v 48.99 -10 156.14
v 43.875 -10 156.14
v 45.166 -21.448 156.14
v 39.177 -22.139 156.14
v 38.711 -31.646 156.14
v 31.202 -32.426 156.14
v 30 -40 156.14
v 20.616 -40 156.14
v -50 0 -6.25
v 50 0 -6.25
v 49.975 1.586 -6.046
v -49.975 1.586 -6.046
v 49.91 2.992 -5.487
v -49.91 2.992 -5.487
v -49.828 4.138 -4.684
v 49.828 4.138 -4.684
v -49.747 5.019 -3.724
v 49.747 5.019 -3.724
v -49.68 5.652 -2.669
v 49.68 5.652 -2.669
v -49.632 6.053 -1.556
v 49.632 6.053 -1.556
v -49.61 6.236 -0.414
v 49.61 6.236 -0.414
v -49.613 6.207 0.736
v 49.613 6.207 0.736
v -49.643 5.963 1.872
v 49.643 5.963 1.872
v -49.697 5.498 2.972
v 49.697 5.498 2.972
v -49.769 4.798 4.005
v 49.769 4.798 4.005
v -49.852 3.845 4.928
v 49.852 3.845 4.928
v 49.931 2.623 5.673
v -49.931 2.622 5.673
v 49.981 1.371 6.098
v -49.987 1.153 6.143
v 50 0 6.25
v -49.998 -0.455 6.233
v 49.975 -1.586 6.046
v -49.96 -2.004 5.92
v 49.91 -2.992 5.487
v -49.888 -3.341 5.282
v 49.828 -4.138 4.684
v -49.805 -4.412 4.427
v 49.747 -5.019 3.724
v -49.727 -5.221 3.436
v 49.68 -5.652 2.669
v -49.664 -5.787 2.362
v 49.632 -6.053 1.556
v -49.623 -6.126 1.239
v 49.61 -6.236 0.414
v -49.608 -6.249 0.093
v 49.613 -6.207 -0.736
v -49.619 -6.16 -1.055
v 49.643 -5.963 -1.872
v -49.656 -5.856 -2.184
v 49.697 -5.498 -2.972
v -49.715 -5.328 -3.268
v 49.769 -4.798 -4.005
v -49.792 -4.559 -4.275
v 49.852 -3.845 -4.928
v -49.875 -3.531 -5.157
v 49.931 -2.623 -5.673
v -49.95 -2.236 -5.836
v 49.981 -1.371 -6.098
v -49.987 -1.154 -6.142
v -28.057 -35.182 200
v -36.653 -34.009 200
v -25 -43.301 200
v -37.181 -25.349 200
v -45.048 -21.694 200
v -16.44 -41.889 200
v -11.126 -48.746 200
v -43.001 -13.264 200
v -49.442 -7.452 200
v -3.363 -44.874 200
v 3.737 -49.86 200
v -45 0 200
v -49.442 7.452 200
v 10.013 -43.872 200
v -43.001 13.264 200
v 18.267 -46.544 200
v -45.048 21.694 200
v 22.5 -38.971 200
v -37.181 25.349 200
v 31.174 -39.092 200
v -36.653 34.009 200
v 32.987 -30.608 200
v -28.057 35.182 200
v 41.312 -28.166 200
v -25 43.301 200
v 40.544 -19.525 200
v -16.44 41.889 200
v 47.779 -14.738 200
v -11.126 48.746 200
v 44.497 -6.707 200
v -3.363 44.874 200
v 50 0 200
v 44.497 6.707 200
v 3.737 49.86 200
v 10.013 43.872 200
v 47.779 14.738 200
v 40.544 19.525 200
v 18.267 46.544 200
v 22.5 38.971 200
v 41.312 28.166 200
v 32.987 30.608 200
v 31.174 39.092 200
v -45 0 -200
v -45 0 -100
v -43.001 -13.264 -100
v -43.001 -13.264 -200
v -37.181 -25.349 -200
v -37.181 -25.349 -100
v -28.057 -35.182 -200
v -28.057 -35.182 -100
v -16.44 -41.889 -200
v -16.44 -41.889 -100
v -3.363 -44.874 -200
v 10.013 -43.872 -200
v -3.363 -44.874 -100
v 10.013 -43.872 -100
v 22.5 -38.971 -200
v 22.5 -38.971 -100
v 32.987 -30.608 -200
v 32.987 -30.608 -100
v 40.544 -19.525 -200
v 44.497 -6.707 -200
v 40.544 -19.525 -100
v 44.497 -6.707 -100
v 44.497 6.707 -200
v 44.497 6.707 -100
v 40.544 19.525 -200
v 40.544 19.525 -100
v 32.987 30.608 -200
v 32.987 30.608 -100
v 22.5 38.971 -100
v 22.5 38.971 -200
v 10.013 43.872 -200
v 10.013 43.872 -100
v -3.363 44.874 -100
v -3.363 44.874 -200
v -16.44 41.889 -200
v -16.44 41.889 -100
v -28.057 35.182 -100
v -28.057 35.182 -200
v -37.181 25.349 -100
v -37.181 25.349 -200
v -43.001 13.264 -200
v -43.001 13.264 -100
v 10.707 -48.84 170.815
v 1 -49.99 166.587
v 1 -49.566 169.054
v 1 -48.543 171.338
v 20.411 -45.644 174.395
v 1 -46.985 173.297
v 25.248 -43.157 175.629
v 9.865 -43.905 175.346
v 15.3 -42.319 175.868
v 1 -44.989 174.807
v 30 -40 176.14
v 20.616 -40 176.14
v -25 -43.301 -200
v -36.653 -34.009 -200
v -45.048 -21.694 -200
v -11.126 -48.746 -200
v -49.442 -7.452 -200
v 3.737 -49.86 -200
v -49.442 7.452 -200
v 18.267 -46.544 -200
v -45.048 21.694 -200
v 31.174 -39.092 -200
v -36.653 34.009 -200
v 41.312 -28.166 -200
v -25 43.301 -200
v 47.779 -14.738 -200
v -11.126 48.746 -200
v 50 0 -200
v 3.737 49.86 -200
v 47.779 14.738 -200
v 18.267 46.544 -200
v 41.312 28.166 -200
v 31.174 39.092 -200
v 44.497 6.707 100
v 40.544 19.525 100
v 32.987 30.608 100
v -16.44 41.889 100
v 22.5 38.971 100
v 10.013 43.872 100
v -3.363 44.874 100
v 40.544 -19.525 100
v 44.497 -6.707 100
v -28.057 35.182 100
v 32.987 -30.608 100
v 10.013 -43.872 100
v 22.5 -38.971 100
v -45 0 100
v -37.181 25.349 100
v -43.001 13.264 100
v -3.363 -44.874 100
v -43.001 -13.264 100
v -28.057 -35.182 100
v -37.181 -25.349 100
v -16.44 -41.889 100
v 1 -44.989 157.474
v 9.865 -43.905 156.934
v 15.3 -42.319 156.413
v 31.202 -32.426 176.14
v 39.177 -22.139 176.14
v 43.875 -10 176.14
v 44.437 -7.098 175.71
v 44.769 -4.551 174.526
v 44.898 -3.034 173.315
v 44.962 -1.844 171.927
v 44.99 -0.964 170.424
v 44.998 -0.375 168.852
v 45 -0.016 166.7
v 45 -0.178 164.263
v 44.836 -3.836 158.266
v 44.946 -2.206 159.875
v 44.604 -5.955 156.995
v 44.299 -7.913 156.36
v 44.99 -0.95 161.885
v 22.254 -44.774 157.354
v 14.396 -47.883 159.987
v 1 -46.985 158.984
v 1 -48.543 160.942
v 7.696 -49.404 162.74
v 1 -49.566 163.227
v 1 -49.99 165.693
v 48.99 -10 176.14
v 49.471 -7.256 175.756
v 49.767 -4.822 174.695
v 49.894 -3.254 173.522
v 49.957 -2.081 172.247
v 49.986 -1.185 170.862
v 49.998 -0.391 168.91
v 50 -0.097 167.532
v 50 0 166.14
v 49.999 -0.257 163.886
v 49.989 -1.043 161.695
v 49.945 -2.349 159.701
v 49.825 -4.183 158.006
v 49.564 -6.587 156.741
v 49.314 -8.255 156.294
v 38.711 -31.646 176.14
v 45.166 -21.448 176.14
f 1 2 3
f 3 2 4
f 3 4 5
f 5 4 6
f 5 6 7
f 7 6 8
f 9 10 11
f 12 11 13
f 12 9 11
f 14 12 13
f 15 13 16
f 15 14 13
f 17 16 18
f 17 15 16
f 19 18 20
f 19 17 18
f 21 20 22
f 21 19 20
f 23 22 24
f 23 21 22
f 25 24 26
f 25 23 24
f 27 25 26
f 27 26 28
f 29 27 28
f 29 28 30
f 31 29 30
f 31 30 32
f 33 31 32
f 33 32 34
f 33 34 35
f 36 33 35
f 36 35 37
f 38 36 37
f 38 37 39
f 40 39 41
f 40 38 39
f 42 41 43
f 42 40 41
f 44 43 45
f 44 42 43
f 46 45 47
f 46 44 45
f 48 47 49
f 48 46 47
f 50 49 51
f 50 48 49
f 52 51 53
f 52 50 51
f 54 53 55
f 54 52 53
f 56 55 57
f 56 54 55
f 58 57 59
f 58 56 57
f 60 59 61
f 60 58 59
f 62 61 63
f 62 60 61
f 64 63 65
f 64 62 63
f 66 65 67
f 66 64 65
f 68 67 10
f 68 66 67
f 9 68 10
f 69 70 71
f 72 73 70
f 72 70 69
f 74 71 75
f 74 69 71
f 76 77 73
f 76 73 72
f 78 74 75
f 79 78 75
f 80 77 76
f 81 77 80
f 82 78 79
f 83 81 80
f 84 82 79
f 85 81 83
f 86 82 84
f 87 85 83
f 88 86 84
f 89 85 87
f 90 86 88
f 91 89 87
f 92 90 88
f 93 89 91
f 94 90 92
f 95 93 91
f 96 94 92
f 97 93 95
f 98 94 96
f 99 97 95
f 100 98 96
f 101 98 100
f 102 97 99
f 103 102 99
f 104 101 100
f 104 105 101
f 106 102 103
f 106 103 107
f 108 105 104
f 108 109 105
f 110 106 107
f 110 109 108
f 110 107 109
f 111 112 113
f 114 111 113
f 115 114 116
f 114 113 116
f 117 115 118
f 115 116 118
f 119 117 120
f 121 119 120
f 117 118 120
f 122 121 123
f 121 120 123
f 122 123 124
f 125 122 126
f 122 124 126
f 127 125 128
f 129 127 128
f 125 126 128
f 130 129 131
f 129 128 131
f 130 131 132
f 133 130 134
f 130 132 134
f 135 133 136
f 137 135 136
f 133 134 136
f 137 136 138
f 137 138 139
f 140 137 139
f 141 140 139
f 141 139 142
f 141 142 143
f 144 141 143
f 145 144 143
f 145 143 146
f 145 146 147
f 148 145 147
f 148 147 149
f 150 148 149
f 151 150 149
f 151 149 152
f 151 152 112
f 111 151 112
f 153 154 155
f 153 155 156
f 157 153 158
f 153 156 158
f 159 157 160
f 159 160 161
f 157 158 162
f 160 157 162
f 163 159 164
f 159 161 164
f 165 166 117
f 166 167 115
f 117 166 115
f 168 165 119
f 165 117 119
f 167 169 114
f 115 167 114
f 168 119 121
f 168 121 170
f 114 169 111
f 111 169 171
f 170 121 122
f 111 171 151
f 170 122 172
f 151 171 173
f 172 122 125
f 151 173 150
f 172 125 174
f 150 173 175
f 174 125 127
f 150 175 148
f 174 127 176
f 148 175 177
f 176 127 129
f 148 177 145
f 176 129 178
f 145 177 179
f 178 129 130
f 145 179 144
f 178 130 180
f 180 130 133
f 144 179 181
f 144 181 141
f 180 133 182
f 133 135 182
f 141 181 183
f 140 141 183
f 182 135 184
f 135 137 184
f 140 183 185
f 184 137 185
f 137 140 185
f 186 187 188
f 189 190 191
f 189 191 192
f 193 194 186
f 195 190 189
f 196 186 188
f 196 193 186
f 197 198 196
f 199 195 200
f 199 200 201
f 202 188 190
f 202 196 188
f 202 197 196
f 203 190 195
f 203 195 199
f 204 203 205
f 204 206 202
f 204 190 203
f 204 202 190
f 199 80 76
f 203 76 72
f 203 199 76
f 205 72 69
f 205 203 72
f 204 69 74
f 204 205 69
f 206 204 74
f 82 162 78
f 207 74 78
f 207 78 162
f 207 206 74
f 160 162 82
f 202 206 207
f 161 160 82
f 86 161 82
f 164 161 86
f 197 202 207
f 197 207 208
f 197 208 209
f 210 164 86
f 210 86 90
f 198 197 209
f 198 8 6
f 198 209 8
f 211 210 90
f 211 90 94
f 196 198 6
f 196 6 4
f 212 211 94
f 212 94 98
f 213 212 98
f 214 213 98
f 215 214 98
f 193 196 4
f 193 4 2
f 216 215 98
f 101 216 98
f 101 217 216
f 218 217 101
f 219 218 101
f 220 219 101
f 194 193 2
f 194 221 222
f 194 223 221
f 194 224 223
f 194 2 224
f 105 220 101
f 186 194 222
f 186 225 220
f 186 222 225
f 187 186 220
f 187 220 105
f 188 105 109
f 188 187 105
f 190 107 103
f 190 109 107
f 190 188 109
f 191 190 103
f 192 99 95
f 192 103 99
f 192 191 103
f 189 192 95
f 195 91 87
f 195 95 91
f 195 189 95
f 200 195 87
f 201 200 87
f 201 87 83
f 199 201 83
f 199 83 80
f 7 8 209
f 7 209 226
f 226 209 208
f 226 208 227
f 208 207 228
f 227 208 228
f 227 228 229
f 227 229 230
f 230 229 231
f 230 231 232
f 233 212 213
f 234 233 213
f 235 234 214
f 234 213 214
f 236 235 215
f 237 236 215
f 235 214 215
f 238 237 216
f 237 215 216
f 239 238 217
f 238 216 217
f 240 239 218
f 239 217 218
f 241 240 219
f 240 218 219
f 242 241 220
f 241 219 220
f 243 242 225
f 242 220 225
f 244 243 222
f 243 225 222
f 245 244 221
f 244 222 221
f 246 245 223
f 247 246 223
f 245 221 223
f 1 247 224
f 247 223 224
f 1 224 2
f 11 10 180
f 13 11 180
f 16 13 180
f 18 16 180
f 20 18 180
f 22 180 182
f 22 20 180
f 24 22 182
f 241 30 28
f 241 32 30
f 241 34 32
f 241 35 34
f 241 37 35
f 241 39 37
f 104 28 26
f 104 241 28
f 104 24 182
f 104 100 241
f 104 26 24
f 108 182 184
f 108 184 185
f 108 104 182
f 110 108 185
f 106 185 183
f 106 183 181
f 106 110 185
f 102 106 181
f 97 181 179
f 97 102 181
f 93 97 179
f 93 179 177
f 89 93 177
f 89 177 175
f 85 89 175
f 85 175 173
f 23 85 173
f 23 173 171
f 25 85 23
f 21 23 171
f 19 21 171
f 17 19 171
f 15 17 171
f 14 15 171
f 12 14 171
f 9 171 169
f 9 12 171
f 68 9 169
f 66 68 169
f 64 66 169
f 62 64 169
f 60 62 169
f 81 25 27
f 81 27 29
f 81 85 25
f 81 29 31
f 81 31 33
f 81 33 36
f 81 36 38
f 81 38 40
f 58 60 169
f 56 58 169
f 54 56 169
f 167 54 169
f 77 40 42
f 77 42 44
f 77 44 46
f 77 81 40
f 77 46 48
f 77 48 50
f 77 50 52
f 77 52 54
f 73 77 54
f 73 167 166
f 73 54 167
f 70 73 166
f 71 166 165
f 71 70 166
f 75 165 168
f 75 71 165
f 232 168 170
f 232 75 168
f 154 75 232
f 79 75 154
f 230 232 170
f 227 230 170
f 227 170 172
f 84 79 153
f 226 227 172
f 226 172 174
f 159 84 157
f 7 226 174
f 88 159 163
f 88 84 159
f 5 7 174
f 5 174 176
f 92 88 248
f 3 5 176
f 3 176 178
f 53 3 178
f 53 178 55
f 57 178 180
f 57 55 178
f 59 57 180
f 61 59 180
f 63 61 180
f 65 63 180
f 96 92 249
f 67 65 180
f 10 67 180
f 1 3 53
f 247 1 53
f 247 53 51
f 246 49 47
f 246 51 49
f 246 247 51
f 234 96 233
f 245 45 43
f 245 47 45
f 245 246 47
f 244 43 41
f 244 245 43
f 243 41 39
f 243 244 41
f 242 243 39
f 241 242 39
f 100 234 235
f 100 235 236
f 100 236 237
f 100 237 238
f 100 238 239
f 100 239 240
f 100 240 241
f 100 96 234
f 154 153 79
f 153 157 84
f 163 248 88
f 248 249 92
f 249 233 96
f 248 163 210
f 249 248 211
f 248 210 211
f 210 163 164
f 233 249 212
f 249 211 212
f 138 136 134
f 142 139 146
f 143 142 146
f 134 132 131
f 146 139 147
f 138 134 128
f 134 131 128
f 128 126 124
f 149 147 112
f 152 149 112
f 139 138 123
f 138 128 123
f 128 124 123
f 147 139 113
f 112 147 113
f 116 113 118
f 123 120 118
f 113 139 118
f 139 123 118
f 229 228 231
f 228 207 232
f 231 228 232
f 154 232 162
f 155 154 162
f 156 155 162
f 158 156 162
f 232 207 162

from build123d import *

# Parameters (mm, degrees)
ESQUISSE2_R                   = 50
BOSS_EXTRU_1_DEPTH            = 200
ENL_V_MAT_EXTRU_1_DEPTH       = 213.132034356
ENL_V_MAT_EXTRU_1_DEPTH_BACK  = 213.132034356
ESQUISSE3_R                   = 6.25
ENL_V_START                   = -100
ESQUISSE4_R                   = 45
ENL_V_MAT_EXTRU_2_DEPTH       = 507.201920355
ENL_V_MAT_EXTRU_11_DEPTH      = 230.128784901
ENL_V_MAT_EXTRU_11_DEPTH_BACK = 49


with BuildPart() as part:
    # Esquisse2 → Boss.-Extru.1 (new, symmetric)
    with BuildSketch(Plane.XY):
        Circle(ESQUISSE2_R)
    extrude(amount=BOSS_EXTRU_1_DEPTH, both=True)

    # Esquisse3 → Enlèv. mat.-Extru.1 (cut, two sides: drawn at the far end of the back side and taken through both)
    with BuildSketch(Plane(origin=(0, 0, 0), x_dir=(0, 0, -1), z_dir=(1, 0, 0)).offset(-ENL_V_MAT_EXTRU_1_DEPTH_BACK)):
        Circle(ESQUISSE3_R)
    extrude(amount=ENL_V_MAT_EXTRU_1_DEPTH + ENL_V_MAT_EXTRU_1_DEPTH_BACK, mode=Mode.SUBTRACT)

    # Esquisse4 → Enlèv. mat.-Extru.2 (cut)
    with BuildSketch(Plane.XY.offset(200).offset(ENL_V_START)):
        with Locations(Location((0, 0, 0), (0, 0, 180))):
            Circle(ESQUISSE4_R)
    enl_v_mat_extru_2 = extrude(amount=ENL_V_MAT_EXTRU_2_DEPTH, mode=Mode.SUBTRACT)

    # Symétrie1: Enlèv. mat.-Extru.2 across plane
    add(enl_v_mat_extru_2.mirror(Plane.XY), mode=Mode.SUBTRACT)

    # Esquisse5 → Enlèv. mat.-Extru.11 (cut, two sides: drawn at the far end of the back side and taken through both)
    with BuildSketch(Plane(origin=(50, 0, 0), x_dir=(0, 0, -1), z_dir=(1, 0, 0)).offset(-ENL_V_MAT_EXTRU_11_DEPTH_BACK)):
        with BuildLine():
            Line((-156.140277695, -10), (-156.140277695, -40))
            ThreePointArc((-156.140277695, -40), (-166.140277695, -50), (-176.140277695, -40))
            Line((-176.140277695, -40), (-176.140277695, -10))
            ThreePointArc((-176.140277695, -10), (-166.140277695, 0), (-156.140277695, -10))
        make_face()
    extrude(amount=ENL_V_MAT_EXTRU_11_DEPTH + ENL_V_MAT_EXTRU_11_DEPTH_BACK, mode=Mode.SUBTRACT)


solid = part.part
